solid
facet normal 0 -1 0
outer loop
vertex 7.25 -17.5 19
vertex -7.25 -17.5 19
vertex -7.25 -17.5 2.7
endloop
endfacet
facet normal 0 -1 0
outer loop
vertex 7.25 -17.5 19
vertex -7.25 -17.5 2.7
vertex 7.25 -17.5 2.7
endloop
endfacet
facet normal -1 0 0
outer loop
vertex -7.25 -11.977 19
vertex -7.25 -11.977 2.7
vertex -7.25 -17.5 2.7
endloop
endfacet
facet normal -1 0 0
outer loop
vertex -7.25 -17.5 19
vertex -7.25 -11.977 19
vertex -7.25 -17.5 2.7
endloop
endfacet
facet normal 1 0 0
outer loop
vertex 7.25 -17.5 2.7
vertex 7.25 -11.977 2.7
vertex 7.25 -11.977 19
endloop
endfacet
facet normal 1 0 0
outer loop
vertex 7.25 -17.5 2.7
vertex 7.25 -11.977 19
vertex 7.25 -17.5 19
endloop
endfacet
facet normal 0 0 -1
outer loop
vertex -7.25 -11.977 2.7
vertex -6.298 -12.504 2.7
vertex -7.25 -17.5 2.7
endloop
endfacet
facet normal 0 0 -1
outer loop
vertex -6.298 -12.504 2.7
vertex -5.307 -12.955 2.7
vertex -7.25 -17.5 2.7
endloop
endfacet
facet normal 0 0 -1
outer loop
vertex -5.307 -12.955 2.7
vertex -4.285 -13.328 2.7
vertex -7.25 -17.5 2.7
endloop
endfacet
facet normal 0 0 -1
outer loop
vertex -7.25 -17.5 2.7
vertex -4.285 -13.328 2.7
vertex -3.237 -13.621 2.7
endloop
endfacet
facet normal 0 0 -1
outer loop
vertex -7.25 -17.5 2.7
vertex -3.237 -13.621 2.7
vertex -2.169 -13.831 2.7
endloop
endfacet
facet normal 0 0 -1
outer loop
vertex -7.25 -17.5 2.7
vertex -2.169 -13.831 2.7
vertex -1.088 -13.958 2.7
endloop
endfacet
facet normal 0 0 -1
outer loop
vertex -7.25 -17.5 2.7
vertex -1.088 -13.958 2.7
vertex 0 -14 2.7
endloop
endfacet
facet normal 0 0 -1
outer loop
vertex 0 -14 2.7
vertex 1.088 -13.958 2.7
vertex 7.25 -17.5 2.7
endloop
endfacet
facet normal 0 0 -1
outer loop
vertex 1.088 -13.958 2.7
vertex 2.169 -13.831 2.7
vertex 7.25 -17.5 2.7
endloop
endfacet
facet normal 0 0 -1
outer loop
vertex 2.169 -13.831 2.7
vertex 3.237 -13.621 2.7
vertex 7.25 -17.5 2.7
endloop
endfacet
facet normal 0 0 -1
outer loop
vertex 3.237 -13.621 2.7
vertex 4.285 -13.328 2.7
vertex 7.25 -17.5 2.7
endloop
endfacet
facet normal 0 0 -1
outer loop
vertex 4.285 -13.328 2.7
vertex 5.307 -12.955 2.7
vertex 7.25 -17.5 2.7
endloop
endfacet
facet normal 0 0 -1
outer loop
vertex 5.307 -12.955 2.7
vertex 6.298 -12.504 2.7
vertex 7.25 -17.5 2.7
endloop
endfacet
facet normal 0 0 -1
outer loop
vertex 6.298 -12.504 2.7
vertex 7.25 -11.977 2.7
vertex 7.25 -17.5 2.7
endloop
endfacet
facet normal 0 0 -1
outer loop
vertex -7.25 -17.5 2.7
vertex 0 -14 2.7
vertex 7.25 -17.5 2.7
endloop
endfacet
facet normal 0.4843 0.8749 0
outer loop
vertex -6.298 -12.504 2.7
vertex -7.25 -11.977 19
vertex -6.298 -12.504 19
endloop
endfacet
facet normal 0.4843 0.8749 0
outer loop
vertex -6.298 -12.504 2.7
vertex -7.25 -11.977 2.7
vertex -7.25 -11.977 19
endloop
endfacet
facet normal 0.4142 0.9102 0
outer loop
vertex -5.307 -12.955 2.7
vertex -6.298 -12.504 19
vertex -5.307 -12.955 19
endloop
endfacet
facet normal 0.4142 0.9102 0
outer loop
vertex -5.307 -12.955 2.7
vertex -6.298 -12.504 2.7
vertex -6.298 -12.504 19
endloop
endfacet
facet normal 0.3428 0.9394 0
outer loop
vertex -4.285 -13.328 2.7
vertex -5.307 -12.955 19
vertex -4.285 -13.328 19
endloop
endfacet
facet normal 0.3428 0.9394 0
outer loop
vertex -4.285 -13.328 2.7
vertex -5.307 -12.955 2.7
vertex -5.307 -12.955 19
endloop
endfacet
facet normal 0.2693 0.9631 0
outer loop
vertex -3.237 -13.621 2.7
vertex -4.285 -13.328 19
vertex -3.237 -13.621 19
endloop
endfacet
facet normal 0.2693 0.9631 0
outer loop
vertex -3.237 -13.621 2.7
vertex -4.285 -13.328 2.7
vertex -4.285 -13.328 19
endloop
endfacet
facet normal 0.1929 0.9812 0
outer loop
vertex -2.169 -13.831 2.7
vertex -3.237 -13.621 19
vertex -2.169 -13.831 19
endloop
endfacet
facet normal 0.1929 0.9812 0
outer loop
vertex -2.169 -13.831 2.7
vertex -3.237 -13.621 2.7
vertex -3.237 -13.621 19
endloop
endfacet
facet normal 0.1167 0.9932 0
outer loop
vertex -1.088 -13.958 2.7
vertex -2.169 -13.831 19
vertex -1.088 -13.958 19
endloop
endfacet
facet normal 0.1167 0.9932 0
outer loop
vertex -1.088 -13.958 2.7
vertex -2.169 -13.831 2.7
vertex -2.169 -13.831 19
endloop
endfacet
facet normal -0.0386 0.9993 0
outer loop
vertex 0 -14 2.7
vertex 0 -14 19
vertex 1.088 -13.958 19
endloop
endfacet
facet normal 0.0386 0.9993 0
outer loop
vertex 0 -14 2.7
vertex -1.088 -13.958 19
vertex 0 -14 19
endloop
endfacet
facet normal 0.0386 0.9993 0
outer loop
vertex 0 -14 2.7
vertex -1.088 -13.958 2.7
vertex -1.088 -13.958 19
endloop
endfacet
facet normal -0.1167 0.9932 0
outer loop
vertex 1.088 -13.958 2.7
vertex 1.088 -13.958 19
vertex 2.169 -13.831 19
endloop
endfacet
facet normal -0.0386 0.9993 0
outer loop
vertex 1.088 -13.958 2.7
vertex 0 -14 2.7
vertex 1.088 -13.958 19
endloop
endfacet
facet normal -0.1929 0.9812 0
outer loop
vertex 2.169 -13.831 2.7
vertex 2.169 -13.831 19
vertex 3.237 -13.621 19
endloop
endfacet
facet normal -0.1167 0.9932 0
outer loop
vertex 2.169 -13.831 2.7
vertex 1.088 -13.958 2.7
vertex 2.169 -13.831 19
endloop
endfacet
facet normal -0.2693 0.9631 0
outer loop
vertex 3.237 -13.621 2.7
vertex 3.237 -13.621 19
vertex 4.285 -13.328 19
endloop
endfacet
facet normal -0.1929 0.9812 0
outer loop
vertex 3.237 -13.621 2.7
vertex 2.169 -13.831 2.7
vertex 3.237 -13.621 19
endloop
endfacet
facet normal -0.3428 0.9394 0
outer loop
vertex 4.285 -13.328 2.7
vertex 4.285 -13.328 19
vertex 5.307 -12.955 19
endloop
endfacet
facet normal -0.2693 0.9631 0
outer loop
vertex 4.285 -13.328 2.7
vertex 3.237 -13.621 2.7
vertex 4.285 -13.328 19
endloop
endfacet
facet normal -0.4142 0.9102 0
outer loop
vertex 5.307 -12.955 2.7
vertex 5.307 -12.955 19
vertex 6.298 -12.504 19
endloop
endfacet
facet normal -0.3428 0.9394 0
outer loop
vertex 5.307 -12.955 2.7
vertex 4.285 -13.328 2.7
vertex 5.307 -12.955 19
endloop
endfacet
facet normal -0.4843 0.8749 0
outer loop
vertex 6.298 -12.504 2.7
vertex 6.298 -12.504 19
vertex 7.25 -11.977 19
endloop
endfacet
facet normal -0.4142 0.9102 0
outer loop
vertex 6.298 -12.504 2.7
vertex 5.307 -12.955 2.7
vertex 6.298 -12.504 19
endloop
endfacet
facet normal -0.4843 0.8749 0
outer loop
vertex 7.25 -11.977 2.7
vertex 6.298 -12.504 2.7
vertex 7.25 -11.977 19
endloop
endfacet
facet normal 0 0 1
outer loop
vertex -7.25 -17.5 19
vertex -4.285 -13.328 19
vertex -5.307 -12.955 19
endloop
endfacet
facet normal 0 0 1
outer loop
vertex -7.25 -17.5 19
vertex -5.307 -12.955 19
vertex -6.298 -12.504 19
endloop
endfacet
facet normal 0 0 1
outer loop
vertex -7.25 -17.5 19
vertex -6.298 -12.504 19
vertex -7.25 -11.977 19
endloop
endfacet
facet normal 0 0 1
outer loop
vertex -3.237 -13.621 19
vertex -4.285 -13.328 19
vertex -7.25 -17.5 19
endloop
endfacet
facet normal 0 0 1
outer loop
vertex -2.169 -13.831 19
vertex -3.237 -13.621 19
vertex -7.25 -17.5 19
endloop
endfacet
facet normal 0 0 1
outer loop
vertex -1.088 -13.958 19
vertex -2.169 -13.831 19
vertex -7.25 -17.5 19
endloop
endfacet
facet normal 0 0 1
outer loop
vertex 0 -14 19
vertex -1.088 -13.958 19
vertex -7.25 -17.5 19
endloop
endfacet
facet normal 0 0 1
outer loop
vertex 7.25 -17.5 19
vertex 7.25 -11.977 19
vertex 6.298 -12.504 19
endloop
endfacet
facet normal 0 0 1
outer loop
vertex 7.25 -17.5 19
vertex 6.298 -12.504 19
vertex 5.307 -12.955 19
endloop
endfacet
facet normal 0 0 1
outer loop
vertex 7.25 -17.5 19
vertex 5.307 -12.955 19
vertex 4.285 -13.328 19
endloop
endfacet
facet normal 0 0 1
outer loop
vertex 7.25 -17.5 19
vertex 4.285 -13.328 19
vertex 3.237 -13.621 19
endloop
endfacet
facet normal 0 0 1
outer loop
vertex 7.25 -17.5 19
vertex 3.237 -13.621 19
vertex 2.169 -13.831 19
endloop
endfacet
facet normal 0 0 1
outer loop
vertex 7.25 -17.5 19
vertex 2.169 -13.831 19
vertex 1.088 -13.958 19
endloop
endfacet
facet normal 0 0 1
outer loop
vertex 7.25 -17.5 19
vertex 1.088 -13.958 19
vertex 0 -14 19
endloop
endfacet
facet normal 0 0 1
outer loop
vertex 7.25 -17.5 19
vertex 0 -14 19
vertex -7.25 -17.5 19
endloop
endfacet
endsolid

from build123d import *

# Parameters (mm, degrees)
CYLINDER001_R       = 14
CYLINDER001_DEPTH   = 19
BOX_W               = 17.5
BOX_H               = 14.5
BOX_DEPTH           = 16.3
CUT_PLACEMENT_ANGLE = -90


with BuildPart() as cylinder001:
    # Cylinder001 → Cylinder001 (new body)
    with BuildSketch(Plane.XY):
        Circle(CYLINDER001_R)
    extrude(amount=CYLINDER001_DEPTH)


with BuildPart() as cut:
    # Box → Box (new body)
    with BuildSketch(Plane(origin=(0, -7.25, 2.7), x_dir=(1, 0, 0), z_dir=(0, 0, 1))):
        with Locations((8.75, 7.25)):
            Rectangle(BOX_W, BOX_H)
    extrude(amount=BOX_DEPTH)

    # Cut: cut Cylinder001
    add(cylinder001.part, mode=Mode.SUBTRACT)


with BuildPart() as cut_1:
    # Cut placement: moved
    add(cut.part.rotate(Axis((0, 0, 0), (0, 0, 1)), CUT_PLACEMENT_ANGLE))


solid = cut_1.part
